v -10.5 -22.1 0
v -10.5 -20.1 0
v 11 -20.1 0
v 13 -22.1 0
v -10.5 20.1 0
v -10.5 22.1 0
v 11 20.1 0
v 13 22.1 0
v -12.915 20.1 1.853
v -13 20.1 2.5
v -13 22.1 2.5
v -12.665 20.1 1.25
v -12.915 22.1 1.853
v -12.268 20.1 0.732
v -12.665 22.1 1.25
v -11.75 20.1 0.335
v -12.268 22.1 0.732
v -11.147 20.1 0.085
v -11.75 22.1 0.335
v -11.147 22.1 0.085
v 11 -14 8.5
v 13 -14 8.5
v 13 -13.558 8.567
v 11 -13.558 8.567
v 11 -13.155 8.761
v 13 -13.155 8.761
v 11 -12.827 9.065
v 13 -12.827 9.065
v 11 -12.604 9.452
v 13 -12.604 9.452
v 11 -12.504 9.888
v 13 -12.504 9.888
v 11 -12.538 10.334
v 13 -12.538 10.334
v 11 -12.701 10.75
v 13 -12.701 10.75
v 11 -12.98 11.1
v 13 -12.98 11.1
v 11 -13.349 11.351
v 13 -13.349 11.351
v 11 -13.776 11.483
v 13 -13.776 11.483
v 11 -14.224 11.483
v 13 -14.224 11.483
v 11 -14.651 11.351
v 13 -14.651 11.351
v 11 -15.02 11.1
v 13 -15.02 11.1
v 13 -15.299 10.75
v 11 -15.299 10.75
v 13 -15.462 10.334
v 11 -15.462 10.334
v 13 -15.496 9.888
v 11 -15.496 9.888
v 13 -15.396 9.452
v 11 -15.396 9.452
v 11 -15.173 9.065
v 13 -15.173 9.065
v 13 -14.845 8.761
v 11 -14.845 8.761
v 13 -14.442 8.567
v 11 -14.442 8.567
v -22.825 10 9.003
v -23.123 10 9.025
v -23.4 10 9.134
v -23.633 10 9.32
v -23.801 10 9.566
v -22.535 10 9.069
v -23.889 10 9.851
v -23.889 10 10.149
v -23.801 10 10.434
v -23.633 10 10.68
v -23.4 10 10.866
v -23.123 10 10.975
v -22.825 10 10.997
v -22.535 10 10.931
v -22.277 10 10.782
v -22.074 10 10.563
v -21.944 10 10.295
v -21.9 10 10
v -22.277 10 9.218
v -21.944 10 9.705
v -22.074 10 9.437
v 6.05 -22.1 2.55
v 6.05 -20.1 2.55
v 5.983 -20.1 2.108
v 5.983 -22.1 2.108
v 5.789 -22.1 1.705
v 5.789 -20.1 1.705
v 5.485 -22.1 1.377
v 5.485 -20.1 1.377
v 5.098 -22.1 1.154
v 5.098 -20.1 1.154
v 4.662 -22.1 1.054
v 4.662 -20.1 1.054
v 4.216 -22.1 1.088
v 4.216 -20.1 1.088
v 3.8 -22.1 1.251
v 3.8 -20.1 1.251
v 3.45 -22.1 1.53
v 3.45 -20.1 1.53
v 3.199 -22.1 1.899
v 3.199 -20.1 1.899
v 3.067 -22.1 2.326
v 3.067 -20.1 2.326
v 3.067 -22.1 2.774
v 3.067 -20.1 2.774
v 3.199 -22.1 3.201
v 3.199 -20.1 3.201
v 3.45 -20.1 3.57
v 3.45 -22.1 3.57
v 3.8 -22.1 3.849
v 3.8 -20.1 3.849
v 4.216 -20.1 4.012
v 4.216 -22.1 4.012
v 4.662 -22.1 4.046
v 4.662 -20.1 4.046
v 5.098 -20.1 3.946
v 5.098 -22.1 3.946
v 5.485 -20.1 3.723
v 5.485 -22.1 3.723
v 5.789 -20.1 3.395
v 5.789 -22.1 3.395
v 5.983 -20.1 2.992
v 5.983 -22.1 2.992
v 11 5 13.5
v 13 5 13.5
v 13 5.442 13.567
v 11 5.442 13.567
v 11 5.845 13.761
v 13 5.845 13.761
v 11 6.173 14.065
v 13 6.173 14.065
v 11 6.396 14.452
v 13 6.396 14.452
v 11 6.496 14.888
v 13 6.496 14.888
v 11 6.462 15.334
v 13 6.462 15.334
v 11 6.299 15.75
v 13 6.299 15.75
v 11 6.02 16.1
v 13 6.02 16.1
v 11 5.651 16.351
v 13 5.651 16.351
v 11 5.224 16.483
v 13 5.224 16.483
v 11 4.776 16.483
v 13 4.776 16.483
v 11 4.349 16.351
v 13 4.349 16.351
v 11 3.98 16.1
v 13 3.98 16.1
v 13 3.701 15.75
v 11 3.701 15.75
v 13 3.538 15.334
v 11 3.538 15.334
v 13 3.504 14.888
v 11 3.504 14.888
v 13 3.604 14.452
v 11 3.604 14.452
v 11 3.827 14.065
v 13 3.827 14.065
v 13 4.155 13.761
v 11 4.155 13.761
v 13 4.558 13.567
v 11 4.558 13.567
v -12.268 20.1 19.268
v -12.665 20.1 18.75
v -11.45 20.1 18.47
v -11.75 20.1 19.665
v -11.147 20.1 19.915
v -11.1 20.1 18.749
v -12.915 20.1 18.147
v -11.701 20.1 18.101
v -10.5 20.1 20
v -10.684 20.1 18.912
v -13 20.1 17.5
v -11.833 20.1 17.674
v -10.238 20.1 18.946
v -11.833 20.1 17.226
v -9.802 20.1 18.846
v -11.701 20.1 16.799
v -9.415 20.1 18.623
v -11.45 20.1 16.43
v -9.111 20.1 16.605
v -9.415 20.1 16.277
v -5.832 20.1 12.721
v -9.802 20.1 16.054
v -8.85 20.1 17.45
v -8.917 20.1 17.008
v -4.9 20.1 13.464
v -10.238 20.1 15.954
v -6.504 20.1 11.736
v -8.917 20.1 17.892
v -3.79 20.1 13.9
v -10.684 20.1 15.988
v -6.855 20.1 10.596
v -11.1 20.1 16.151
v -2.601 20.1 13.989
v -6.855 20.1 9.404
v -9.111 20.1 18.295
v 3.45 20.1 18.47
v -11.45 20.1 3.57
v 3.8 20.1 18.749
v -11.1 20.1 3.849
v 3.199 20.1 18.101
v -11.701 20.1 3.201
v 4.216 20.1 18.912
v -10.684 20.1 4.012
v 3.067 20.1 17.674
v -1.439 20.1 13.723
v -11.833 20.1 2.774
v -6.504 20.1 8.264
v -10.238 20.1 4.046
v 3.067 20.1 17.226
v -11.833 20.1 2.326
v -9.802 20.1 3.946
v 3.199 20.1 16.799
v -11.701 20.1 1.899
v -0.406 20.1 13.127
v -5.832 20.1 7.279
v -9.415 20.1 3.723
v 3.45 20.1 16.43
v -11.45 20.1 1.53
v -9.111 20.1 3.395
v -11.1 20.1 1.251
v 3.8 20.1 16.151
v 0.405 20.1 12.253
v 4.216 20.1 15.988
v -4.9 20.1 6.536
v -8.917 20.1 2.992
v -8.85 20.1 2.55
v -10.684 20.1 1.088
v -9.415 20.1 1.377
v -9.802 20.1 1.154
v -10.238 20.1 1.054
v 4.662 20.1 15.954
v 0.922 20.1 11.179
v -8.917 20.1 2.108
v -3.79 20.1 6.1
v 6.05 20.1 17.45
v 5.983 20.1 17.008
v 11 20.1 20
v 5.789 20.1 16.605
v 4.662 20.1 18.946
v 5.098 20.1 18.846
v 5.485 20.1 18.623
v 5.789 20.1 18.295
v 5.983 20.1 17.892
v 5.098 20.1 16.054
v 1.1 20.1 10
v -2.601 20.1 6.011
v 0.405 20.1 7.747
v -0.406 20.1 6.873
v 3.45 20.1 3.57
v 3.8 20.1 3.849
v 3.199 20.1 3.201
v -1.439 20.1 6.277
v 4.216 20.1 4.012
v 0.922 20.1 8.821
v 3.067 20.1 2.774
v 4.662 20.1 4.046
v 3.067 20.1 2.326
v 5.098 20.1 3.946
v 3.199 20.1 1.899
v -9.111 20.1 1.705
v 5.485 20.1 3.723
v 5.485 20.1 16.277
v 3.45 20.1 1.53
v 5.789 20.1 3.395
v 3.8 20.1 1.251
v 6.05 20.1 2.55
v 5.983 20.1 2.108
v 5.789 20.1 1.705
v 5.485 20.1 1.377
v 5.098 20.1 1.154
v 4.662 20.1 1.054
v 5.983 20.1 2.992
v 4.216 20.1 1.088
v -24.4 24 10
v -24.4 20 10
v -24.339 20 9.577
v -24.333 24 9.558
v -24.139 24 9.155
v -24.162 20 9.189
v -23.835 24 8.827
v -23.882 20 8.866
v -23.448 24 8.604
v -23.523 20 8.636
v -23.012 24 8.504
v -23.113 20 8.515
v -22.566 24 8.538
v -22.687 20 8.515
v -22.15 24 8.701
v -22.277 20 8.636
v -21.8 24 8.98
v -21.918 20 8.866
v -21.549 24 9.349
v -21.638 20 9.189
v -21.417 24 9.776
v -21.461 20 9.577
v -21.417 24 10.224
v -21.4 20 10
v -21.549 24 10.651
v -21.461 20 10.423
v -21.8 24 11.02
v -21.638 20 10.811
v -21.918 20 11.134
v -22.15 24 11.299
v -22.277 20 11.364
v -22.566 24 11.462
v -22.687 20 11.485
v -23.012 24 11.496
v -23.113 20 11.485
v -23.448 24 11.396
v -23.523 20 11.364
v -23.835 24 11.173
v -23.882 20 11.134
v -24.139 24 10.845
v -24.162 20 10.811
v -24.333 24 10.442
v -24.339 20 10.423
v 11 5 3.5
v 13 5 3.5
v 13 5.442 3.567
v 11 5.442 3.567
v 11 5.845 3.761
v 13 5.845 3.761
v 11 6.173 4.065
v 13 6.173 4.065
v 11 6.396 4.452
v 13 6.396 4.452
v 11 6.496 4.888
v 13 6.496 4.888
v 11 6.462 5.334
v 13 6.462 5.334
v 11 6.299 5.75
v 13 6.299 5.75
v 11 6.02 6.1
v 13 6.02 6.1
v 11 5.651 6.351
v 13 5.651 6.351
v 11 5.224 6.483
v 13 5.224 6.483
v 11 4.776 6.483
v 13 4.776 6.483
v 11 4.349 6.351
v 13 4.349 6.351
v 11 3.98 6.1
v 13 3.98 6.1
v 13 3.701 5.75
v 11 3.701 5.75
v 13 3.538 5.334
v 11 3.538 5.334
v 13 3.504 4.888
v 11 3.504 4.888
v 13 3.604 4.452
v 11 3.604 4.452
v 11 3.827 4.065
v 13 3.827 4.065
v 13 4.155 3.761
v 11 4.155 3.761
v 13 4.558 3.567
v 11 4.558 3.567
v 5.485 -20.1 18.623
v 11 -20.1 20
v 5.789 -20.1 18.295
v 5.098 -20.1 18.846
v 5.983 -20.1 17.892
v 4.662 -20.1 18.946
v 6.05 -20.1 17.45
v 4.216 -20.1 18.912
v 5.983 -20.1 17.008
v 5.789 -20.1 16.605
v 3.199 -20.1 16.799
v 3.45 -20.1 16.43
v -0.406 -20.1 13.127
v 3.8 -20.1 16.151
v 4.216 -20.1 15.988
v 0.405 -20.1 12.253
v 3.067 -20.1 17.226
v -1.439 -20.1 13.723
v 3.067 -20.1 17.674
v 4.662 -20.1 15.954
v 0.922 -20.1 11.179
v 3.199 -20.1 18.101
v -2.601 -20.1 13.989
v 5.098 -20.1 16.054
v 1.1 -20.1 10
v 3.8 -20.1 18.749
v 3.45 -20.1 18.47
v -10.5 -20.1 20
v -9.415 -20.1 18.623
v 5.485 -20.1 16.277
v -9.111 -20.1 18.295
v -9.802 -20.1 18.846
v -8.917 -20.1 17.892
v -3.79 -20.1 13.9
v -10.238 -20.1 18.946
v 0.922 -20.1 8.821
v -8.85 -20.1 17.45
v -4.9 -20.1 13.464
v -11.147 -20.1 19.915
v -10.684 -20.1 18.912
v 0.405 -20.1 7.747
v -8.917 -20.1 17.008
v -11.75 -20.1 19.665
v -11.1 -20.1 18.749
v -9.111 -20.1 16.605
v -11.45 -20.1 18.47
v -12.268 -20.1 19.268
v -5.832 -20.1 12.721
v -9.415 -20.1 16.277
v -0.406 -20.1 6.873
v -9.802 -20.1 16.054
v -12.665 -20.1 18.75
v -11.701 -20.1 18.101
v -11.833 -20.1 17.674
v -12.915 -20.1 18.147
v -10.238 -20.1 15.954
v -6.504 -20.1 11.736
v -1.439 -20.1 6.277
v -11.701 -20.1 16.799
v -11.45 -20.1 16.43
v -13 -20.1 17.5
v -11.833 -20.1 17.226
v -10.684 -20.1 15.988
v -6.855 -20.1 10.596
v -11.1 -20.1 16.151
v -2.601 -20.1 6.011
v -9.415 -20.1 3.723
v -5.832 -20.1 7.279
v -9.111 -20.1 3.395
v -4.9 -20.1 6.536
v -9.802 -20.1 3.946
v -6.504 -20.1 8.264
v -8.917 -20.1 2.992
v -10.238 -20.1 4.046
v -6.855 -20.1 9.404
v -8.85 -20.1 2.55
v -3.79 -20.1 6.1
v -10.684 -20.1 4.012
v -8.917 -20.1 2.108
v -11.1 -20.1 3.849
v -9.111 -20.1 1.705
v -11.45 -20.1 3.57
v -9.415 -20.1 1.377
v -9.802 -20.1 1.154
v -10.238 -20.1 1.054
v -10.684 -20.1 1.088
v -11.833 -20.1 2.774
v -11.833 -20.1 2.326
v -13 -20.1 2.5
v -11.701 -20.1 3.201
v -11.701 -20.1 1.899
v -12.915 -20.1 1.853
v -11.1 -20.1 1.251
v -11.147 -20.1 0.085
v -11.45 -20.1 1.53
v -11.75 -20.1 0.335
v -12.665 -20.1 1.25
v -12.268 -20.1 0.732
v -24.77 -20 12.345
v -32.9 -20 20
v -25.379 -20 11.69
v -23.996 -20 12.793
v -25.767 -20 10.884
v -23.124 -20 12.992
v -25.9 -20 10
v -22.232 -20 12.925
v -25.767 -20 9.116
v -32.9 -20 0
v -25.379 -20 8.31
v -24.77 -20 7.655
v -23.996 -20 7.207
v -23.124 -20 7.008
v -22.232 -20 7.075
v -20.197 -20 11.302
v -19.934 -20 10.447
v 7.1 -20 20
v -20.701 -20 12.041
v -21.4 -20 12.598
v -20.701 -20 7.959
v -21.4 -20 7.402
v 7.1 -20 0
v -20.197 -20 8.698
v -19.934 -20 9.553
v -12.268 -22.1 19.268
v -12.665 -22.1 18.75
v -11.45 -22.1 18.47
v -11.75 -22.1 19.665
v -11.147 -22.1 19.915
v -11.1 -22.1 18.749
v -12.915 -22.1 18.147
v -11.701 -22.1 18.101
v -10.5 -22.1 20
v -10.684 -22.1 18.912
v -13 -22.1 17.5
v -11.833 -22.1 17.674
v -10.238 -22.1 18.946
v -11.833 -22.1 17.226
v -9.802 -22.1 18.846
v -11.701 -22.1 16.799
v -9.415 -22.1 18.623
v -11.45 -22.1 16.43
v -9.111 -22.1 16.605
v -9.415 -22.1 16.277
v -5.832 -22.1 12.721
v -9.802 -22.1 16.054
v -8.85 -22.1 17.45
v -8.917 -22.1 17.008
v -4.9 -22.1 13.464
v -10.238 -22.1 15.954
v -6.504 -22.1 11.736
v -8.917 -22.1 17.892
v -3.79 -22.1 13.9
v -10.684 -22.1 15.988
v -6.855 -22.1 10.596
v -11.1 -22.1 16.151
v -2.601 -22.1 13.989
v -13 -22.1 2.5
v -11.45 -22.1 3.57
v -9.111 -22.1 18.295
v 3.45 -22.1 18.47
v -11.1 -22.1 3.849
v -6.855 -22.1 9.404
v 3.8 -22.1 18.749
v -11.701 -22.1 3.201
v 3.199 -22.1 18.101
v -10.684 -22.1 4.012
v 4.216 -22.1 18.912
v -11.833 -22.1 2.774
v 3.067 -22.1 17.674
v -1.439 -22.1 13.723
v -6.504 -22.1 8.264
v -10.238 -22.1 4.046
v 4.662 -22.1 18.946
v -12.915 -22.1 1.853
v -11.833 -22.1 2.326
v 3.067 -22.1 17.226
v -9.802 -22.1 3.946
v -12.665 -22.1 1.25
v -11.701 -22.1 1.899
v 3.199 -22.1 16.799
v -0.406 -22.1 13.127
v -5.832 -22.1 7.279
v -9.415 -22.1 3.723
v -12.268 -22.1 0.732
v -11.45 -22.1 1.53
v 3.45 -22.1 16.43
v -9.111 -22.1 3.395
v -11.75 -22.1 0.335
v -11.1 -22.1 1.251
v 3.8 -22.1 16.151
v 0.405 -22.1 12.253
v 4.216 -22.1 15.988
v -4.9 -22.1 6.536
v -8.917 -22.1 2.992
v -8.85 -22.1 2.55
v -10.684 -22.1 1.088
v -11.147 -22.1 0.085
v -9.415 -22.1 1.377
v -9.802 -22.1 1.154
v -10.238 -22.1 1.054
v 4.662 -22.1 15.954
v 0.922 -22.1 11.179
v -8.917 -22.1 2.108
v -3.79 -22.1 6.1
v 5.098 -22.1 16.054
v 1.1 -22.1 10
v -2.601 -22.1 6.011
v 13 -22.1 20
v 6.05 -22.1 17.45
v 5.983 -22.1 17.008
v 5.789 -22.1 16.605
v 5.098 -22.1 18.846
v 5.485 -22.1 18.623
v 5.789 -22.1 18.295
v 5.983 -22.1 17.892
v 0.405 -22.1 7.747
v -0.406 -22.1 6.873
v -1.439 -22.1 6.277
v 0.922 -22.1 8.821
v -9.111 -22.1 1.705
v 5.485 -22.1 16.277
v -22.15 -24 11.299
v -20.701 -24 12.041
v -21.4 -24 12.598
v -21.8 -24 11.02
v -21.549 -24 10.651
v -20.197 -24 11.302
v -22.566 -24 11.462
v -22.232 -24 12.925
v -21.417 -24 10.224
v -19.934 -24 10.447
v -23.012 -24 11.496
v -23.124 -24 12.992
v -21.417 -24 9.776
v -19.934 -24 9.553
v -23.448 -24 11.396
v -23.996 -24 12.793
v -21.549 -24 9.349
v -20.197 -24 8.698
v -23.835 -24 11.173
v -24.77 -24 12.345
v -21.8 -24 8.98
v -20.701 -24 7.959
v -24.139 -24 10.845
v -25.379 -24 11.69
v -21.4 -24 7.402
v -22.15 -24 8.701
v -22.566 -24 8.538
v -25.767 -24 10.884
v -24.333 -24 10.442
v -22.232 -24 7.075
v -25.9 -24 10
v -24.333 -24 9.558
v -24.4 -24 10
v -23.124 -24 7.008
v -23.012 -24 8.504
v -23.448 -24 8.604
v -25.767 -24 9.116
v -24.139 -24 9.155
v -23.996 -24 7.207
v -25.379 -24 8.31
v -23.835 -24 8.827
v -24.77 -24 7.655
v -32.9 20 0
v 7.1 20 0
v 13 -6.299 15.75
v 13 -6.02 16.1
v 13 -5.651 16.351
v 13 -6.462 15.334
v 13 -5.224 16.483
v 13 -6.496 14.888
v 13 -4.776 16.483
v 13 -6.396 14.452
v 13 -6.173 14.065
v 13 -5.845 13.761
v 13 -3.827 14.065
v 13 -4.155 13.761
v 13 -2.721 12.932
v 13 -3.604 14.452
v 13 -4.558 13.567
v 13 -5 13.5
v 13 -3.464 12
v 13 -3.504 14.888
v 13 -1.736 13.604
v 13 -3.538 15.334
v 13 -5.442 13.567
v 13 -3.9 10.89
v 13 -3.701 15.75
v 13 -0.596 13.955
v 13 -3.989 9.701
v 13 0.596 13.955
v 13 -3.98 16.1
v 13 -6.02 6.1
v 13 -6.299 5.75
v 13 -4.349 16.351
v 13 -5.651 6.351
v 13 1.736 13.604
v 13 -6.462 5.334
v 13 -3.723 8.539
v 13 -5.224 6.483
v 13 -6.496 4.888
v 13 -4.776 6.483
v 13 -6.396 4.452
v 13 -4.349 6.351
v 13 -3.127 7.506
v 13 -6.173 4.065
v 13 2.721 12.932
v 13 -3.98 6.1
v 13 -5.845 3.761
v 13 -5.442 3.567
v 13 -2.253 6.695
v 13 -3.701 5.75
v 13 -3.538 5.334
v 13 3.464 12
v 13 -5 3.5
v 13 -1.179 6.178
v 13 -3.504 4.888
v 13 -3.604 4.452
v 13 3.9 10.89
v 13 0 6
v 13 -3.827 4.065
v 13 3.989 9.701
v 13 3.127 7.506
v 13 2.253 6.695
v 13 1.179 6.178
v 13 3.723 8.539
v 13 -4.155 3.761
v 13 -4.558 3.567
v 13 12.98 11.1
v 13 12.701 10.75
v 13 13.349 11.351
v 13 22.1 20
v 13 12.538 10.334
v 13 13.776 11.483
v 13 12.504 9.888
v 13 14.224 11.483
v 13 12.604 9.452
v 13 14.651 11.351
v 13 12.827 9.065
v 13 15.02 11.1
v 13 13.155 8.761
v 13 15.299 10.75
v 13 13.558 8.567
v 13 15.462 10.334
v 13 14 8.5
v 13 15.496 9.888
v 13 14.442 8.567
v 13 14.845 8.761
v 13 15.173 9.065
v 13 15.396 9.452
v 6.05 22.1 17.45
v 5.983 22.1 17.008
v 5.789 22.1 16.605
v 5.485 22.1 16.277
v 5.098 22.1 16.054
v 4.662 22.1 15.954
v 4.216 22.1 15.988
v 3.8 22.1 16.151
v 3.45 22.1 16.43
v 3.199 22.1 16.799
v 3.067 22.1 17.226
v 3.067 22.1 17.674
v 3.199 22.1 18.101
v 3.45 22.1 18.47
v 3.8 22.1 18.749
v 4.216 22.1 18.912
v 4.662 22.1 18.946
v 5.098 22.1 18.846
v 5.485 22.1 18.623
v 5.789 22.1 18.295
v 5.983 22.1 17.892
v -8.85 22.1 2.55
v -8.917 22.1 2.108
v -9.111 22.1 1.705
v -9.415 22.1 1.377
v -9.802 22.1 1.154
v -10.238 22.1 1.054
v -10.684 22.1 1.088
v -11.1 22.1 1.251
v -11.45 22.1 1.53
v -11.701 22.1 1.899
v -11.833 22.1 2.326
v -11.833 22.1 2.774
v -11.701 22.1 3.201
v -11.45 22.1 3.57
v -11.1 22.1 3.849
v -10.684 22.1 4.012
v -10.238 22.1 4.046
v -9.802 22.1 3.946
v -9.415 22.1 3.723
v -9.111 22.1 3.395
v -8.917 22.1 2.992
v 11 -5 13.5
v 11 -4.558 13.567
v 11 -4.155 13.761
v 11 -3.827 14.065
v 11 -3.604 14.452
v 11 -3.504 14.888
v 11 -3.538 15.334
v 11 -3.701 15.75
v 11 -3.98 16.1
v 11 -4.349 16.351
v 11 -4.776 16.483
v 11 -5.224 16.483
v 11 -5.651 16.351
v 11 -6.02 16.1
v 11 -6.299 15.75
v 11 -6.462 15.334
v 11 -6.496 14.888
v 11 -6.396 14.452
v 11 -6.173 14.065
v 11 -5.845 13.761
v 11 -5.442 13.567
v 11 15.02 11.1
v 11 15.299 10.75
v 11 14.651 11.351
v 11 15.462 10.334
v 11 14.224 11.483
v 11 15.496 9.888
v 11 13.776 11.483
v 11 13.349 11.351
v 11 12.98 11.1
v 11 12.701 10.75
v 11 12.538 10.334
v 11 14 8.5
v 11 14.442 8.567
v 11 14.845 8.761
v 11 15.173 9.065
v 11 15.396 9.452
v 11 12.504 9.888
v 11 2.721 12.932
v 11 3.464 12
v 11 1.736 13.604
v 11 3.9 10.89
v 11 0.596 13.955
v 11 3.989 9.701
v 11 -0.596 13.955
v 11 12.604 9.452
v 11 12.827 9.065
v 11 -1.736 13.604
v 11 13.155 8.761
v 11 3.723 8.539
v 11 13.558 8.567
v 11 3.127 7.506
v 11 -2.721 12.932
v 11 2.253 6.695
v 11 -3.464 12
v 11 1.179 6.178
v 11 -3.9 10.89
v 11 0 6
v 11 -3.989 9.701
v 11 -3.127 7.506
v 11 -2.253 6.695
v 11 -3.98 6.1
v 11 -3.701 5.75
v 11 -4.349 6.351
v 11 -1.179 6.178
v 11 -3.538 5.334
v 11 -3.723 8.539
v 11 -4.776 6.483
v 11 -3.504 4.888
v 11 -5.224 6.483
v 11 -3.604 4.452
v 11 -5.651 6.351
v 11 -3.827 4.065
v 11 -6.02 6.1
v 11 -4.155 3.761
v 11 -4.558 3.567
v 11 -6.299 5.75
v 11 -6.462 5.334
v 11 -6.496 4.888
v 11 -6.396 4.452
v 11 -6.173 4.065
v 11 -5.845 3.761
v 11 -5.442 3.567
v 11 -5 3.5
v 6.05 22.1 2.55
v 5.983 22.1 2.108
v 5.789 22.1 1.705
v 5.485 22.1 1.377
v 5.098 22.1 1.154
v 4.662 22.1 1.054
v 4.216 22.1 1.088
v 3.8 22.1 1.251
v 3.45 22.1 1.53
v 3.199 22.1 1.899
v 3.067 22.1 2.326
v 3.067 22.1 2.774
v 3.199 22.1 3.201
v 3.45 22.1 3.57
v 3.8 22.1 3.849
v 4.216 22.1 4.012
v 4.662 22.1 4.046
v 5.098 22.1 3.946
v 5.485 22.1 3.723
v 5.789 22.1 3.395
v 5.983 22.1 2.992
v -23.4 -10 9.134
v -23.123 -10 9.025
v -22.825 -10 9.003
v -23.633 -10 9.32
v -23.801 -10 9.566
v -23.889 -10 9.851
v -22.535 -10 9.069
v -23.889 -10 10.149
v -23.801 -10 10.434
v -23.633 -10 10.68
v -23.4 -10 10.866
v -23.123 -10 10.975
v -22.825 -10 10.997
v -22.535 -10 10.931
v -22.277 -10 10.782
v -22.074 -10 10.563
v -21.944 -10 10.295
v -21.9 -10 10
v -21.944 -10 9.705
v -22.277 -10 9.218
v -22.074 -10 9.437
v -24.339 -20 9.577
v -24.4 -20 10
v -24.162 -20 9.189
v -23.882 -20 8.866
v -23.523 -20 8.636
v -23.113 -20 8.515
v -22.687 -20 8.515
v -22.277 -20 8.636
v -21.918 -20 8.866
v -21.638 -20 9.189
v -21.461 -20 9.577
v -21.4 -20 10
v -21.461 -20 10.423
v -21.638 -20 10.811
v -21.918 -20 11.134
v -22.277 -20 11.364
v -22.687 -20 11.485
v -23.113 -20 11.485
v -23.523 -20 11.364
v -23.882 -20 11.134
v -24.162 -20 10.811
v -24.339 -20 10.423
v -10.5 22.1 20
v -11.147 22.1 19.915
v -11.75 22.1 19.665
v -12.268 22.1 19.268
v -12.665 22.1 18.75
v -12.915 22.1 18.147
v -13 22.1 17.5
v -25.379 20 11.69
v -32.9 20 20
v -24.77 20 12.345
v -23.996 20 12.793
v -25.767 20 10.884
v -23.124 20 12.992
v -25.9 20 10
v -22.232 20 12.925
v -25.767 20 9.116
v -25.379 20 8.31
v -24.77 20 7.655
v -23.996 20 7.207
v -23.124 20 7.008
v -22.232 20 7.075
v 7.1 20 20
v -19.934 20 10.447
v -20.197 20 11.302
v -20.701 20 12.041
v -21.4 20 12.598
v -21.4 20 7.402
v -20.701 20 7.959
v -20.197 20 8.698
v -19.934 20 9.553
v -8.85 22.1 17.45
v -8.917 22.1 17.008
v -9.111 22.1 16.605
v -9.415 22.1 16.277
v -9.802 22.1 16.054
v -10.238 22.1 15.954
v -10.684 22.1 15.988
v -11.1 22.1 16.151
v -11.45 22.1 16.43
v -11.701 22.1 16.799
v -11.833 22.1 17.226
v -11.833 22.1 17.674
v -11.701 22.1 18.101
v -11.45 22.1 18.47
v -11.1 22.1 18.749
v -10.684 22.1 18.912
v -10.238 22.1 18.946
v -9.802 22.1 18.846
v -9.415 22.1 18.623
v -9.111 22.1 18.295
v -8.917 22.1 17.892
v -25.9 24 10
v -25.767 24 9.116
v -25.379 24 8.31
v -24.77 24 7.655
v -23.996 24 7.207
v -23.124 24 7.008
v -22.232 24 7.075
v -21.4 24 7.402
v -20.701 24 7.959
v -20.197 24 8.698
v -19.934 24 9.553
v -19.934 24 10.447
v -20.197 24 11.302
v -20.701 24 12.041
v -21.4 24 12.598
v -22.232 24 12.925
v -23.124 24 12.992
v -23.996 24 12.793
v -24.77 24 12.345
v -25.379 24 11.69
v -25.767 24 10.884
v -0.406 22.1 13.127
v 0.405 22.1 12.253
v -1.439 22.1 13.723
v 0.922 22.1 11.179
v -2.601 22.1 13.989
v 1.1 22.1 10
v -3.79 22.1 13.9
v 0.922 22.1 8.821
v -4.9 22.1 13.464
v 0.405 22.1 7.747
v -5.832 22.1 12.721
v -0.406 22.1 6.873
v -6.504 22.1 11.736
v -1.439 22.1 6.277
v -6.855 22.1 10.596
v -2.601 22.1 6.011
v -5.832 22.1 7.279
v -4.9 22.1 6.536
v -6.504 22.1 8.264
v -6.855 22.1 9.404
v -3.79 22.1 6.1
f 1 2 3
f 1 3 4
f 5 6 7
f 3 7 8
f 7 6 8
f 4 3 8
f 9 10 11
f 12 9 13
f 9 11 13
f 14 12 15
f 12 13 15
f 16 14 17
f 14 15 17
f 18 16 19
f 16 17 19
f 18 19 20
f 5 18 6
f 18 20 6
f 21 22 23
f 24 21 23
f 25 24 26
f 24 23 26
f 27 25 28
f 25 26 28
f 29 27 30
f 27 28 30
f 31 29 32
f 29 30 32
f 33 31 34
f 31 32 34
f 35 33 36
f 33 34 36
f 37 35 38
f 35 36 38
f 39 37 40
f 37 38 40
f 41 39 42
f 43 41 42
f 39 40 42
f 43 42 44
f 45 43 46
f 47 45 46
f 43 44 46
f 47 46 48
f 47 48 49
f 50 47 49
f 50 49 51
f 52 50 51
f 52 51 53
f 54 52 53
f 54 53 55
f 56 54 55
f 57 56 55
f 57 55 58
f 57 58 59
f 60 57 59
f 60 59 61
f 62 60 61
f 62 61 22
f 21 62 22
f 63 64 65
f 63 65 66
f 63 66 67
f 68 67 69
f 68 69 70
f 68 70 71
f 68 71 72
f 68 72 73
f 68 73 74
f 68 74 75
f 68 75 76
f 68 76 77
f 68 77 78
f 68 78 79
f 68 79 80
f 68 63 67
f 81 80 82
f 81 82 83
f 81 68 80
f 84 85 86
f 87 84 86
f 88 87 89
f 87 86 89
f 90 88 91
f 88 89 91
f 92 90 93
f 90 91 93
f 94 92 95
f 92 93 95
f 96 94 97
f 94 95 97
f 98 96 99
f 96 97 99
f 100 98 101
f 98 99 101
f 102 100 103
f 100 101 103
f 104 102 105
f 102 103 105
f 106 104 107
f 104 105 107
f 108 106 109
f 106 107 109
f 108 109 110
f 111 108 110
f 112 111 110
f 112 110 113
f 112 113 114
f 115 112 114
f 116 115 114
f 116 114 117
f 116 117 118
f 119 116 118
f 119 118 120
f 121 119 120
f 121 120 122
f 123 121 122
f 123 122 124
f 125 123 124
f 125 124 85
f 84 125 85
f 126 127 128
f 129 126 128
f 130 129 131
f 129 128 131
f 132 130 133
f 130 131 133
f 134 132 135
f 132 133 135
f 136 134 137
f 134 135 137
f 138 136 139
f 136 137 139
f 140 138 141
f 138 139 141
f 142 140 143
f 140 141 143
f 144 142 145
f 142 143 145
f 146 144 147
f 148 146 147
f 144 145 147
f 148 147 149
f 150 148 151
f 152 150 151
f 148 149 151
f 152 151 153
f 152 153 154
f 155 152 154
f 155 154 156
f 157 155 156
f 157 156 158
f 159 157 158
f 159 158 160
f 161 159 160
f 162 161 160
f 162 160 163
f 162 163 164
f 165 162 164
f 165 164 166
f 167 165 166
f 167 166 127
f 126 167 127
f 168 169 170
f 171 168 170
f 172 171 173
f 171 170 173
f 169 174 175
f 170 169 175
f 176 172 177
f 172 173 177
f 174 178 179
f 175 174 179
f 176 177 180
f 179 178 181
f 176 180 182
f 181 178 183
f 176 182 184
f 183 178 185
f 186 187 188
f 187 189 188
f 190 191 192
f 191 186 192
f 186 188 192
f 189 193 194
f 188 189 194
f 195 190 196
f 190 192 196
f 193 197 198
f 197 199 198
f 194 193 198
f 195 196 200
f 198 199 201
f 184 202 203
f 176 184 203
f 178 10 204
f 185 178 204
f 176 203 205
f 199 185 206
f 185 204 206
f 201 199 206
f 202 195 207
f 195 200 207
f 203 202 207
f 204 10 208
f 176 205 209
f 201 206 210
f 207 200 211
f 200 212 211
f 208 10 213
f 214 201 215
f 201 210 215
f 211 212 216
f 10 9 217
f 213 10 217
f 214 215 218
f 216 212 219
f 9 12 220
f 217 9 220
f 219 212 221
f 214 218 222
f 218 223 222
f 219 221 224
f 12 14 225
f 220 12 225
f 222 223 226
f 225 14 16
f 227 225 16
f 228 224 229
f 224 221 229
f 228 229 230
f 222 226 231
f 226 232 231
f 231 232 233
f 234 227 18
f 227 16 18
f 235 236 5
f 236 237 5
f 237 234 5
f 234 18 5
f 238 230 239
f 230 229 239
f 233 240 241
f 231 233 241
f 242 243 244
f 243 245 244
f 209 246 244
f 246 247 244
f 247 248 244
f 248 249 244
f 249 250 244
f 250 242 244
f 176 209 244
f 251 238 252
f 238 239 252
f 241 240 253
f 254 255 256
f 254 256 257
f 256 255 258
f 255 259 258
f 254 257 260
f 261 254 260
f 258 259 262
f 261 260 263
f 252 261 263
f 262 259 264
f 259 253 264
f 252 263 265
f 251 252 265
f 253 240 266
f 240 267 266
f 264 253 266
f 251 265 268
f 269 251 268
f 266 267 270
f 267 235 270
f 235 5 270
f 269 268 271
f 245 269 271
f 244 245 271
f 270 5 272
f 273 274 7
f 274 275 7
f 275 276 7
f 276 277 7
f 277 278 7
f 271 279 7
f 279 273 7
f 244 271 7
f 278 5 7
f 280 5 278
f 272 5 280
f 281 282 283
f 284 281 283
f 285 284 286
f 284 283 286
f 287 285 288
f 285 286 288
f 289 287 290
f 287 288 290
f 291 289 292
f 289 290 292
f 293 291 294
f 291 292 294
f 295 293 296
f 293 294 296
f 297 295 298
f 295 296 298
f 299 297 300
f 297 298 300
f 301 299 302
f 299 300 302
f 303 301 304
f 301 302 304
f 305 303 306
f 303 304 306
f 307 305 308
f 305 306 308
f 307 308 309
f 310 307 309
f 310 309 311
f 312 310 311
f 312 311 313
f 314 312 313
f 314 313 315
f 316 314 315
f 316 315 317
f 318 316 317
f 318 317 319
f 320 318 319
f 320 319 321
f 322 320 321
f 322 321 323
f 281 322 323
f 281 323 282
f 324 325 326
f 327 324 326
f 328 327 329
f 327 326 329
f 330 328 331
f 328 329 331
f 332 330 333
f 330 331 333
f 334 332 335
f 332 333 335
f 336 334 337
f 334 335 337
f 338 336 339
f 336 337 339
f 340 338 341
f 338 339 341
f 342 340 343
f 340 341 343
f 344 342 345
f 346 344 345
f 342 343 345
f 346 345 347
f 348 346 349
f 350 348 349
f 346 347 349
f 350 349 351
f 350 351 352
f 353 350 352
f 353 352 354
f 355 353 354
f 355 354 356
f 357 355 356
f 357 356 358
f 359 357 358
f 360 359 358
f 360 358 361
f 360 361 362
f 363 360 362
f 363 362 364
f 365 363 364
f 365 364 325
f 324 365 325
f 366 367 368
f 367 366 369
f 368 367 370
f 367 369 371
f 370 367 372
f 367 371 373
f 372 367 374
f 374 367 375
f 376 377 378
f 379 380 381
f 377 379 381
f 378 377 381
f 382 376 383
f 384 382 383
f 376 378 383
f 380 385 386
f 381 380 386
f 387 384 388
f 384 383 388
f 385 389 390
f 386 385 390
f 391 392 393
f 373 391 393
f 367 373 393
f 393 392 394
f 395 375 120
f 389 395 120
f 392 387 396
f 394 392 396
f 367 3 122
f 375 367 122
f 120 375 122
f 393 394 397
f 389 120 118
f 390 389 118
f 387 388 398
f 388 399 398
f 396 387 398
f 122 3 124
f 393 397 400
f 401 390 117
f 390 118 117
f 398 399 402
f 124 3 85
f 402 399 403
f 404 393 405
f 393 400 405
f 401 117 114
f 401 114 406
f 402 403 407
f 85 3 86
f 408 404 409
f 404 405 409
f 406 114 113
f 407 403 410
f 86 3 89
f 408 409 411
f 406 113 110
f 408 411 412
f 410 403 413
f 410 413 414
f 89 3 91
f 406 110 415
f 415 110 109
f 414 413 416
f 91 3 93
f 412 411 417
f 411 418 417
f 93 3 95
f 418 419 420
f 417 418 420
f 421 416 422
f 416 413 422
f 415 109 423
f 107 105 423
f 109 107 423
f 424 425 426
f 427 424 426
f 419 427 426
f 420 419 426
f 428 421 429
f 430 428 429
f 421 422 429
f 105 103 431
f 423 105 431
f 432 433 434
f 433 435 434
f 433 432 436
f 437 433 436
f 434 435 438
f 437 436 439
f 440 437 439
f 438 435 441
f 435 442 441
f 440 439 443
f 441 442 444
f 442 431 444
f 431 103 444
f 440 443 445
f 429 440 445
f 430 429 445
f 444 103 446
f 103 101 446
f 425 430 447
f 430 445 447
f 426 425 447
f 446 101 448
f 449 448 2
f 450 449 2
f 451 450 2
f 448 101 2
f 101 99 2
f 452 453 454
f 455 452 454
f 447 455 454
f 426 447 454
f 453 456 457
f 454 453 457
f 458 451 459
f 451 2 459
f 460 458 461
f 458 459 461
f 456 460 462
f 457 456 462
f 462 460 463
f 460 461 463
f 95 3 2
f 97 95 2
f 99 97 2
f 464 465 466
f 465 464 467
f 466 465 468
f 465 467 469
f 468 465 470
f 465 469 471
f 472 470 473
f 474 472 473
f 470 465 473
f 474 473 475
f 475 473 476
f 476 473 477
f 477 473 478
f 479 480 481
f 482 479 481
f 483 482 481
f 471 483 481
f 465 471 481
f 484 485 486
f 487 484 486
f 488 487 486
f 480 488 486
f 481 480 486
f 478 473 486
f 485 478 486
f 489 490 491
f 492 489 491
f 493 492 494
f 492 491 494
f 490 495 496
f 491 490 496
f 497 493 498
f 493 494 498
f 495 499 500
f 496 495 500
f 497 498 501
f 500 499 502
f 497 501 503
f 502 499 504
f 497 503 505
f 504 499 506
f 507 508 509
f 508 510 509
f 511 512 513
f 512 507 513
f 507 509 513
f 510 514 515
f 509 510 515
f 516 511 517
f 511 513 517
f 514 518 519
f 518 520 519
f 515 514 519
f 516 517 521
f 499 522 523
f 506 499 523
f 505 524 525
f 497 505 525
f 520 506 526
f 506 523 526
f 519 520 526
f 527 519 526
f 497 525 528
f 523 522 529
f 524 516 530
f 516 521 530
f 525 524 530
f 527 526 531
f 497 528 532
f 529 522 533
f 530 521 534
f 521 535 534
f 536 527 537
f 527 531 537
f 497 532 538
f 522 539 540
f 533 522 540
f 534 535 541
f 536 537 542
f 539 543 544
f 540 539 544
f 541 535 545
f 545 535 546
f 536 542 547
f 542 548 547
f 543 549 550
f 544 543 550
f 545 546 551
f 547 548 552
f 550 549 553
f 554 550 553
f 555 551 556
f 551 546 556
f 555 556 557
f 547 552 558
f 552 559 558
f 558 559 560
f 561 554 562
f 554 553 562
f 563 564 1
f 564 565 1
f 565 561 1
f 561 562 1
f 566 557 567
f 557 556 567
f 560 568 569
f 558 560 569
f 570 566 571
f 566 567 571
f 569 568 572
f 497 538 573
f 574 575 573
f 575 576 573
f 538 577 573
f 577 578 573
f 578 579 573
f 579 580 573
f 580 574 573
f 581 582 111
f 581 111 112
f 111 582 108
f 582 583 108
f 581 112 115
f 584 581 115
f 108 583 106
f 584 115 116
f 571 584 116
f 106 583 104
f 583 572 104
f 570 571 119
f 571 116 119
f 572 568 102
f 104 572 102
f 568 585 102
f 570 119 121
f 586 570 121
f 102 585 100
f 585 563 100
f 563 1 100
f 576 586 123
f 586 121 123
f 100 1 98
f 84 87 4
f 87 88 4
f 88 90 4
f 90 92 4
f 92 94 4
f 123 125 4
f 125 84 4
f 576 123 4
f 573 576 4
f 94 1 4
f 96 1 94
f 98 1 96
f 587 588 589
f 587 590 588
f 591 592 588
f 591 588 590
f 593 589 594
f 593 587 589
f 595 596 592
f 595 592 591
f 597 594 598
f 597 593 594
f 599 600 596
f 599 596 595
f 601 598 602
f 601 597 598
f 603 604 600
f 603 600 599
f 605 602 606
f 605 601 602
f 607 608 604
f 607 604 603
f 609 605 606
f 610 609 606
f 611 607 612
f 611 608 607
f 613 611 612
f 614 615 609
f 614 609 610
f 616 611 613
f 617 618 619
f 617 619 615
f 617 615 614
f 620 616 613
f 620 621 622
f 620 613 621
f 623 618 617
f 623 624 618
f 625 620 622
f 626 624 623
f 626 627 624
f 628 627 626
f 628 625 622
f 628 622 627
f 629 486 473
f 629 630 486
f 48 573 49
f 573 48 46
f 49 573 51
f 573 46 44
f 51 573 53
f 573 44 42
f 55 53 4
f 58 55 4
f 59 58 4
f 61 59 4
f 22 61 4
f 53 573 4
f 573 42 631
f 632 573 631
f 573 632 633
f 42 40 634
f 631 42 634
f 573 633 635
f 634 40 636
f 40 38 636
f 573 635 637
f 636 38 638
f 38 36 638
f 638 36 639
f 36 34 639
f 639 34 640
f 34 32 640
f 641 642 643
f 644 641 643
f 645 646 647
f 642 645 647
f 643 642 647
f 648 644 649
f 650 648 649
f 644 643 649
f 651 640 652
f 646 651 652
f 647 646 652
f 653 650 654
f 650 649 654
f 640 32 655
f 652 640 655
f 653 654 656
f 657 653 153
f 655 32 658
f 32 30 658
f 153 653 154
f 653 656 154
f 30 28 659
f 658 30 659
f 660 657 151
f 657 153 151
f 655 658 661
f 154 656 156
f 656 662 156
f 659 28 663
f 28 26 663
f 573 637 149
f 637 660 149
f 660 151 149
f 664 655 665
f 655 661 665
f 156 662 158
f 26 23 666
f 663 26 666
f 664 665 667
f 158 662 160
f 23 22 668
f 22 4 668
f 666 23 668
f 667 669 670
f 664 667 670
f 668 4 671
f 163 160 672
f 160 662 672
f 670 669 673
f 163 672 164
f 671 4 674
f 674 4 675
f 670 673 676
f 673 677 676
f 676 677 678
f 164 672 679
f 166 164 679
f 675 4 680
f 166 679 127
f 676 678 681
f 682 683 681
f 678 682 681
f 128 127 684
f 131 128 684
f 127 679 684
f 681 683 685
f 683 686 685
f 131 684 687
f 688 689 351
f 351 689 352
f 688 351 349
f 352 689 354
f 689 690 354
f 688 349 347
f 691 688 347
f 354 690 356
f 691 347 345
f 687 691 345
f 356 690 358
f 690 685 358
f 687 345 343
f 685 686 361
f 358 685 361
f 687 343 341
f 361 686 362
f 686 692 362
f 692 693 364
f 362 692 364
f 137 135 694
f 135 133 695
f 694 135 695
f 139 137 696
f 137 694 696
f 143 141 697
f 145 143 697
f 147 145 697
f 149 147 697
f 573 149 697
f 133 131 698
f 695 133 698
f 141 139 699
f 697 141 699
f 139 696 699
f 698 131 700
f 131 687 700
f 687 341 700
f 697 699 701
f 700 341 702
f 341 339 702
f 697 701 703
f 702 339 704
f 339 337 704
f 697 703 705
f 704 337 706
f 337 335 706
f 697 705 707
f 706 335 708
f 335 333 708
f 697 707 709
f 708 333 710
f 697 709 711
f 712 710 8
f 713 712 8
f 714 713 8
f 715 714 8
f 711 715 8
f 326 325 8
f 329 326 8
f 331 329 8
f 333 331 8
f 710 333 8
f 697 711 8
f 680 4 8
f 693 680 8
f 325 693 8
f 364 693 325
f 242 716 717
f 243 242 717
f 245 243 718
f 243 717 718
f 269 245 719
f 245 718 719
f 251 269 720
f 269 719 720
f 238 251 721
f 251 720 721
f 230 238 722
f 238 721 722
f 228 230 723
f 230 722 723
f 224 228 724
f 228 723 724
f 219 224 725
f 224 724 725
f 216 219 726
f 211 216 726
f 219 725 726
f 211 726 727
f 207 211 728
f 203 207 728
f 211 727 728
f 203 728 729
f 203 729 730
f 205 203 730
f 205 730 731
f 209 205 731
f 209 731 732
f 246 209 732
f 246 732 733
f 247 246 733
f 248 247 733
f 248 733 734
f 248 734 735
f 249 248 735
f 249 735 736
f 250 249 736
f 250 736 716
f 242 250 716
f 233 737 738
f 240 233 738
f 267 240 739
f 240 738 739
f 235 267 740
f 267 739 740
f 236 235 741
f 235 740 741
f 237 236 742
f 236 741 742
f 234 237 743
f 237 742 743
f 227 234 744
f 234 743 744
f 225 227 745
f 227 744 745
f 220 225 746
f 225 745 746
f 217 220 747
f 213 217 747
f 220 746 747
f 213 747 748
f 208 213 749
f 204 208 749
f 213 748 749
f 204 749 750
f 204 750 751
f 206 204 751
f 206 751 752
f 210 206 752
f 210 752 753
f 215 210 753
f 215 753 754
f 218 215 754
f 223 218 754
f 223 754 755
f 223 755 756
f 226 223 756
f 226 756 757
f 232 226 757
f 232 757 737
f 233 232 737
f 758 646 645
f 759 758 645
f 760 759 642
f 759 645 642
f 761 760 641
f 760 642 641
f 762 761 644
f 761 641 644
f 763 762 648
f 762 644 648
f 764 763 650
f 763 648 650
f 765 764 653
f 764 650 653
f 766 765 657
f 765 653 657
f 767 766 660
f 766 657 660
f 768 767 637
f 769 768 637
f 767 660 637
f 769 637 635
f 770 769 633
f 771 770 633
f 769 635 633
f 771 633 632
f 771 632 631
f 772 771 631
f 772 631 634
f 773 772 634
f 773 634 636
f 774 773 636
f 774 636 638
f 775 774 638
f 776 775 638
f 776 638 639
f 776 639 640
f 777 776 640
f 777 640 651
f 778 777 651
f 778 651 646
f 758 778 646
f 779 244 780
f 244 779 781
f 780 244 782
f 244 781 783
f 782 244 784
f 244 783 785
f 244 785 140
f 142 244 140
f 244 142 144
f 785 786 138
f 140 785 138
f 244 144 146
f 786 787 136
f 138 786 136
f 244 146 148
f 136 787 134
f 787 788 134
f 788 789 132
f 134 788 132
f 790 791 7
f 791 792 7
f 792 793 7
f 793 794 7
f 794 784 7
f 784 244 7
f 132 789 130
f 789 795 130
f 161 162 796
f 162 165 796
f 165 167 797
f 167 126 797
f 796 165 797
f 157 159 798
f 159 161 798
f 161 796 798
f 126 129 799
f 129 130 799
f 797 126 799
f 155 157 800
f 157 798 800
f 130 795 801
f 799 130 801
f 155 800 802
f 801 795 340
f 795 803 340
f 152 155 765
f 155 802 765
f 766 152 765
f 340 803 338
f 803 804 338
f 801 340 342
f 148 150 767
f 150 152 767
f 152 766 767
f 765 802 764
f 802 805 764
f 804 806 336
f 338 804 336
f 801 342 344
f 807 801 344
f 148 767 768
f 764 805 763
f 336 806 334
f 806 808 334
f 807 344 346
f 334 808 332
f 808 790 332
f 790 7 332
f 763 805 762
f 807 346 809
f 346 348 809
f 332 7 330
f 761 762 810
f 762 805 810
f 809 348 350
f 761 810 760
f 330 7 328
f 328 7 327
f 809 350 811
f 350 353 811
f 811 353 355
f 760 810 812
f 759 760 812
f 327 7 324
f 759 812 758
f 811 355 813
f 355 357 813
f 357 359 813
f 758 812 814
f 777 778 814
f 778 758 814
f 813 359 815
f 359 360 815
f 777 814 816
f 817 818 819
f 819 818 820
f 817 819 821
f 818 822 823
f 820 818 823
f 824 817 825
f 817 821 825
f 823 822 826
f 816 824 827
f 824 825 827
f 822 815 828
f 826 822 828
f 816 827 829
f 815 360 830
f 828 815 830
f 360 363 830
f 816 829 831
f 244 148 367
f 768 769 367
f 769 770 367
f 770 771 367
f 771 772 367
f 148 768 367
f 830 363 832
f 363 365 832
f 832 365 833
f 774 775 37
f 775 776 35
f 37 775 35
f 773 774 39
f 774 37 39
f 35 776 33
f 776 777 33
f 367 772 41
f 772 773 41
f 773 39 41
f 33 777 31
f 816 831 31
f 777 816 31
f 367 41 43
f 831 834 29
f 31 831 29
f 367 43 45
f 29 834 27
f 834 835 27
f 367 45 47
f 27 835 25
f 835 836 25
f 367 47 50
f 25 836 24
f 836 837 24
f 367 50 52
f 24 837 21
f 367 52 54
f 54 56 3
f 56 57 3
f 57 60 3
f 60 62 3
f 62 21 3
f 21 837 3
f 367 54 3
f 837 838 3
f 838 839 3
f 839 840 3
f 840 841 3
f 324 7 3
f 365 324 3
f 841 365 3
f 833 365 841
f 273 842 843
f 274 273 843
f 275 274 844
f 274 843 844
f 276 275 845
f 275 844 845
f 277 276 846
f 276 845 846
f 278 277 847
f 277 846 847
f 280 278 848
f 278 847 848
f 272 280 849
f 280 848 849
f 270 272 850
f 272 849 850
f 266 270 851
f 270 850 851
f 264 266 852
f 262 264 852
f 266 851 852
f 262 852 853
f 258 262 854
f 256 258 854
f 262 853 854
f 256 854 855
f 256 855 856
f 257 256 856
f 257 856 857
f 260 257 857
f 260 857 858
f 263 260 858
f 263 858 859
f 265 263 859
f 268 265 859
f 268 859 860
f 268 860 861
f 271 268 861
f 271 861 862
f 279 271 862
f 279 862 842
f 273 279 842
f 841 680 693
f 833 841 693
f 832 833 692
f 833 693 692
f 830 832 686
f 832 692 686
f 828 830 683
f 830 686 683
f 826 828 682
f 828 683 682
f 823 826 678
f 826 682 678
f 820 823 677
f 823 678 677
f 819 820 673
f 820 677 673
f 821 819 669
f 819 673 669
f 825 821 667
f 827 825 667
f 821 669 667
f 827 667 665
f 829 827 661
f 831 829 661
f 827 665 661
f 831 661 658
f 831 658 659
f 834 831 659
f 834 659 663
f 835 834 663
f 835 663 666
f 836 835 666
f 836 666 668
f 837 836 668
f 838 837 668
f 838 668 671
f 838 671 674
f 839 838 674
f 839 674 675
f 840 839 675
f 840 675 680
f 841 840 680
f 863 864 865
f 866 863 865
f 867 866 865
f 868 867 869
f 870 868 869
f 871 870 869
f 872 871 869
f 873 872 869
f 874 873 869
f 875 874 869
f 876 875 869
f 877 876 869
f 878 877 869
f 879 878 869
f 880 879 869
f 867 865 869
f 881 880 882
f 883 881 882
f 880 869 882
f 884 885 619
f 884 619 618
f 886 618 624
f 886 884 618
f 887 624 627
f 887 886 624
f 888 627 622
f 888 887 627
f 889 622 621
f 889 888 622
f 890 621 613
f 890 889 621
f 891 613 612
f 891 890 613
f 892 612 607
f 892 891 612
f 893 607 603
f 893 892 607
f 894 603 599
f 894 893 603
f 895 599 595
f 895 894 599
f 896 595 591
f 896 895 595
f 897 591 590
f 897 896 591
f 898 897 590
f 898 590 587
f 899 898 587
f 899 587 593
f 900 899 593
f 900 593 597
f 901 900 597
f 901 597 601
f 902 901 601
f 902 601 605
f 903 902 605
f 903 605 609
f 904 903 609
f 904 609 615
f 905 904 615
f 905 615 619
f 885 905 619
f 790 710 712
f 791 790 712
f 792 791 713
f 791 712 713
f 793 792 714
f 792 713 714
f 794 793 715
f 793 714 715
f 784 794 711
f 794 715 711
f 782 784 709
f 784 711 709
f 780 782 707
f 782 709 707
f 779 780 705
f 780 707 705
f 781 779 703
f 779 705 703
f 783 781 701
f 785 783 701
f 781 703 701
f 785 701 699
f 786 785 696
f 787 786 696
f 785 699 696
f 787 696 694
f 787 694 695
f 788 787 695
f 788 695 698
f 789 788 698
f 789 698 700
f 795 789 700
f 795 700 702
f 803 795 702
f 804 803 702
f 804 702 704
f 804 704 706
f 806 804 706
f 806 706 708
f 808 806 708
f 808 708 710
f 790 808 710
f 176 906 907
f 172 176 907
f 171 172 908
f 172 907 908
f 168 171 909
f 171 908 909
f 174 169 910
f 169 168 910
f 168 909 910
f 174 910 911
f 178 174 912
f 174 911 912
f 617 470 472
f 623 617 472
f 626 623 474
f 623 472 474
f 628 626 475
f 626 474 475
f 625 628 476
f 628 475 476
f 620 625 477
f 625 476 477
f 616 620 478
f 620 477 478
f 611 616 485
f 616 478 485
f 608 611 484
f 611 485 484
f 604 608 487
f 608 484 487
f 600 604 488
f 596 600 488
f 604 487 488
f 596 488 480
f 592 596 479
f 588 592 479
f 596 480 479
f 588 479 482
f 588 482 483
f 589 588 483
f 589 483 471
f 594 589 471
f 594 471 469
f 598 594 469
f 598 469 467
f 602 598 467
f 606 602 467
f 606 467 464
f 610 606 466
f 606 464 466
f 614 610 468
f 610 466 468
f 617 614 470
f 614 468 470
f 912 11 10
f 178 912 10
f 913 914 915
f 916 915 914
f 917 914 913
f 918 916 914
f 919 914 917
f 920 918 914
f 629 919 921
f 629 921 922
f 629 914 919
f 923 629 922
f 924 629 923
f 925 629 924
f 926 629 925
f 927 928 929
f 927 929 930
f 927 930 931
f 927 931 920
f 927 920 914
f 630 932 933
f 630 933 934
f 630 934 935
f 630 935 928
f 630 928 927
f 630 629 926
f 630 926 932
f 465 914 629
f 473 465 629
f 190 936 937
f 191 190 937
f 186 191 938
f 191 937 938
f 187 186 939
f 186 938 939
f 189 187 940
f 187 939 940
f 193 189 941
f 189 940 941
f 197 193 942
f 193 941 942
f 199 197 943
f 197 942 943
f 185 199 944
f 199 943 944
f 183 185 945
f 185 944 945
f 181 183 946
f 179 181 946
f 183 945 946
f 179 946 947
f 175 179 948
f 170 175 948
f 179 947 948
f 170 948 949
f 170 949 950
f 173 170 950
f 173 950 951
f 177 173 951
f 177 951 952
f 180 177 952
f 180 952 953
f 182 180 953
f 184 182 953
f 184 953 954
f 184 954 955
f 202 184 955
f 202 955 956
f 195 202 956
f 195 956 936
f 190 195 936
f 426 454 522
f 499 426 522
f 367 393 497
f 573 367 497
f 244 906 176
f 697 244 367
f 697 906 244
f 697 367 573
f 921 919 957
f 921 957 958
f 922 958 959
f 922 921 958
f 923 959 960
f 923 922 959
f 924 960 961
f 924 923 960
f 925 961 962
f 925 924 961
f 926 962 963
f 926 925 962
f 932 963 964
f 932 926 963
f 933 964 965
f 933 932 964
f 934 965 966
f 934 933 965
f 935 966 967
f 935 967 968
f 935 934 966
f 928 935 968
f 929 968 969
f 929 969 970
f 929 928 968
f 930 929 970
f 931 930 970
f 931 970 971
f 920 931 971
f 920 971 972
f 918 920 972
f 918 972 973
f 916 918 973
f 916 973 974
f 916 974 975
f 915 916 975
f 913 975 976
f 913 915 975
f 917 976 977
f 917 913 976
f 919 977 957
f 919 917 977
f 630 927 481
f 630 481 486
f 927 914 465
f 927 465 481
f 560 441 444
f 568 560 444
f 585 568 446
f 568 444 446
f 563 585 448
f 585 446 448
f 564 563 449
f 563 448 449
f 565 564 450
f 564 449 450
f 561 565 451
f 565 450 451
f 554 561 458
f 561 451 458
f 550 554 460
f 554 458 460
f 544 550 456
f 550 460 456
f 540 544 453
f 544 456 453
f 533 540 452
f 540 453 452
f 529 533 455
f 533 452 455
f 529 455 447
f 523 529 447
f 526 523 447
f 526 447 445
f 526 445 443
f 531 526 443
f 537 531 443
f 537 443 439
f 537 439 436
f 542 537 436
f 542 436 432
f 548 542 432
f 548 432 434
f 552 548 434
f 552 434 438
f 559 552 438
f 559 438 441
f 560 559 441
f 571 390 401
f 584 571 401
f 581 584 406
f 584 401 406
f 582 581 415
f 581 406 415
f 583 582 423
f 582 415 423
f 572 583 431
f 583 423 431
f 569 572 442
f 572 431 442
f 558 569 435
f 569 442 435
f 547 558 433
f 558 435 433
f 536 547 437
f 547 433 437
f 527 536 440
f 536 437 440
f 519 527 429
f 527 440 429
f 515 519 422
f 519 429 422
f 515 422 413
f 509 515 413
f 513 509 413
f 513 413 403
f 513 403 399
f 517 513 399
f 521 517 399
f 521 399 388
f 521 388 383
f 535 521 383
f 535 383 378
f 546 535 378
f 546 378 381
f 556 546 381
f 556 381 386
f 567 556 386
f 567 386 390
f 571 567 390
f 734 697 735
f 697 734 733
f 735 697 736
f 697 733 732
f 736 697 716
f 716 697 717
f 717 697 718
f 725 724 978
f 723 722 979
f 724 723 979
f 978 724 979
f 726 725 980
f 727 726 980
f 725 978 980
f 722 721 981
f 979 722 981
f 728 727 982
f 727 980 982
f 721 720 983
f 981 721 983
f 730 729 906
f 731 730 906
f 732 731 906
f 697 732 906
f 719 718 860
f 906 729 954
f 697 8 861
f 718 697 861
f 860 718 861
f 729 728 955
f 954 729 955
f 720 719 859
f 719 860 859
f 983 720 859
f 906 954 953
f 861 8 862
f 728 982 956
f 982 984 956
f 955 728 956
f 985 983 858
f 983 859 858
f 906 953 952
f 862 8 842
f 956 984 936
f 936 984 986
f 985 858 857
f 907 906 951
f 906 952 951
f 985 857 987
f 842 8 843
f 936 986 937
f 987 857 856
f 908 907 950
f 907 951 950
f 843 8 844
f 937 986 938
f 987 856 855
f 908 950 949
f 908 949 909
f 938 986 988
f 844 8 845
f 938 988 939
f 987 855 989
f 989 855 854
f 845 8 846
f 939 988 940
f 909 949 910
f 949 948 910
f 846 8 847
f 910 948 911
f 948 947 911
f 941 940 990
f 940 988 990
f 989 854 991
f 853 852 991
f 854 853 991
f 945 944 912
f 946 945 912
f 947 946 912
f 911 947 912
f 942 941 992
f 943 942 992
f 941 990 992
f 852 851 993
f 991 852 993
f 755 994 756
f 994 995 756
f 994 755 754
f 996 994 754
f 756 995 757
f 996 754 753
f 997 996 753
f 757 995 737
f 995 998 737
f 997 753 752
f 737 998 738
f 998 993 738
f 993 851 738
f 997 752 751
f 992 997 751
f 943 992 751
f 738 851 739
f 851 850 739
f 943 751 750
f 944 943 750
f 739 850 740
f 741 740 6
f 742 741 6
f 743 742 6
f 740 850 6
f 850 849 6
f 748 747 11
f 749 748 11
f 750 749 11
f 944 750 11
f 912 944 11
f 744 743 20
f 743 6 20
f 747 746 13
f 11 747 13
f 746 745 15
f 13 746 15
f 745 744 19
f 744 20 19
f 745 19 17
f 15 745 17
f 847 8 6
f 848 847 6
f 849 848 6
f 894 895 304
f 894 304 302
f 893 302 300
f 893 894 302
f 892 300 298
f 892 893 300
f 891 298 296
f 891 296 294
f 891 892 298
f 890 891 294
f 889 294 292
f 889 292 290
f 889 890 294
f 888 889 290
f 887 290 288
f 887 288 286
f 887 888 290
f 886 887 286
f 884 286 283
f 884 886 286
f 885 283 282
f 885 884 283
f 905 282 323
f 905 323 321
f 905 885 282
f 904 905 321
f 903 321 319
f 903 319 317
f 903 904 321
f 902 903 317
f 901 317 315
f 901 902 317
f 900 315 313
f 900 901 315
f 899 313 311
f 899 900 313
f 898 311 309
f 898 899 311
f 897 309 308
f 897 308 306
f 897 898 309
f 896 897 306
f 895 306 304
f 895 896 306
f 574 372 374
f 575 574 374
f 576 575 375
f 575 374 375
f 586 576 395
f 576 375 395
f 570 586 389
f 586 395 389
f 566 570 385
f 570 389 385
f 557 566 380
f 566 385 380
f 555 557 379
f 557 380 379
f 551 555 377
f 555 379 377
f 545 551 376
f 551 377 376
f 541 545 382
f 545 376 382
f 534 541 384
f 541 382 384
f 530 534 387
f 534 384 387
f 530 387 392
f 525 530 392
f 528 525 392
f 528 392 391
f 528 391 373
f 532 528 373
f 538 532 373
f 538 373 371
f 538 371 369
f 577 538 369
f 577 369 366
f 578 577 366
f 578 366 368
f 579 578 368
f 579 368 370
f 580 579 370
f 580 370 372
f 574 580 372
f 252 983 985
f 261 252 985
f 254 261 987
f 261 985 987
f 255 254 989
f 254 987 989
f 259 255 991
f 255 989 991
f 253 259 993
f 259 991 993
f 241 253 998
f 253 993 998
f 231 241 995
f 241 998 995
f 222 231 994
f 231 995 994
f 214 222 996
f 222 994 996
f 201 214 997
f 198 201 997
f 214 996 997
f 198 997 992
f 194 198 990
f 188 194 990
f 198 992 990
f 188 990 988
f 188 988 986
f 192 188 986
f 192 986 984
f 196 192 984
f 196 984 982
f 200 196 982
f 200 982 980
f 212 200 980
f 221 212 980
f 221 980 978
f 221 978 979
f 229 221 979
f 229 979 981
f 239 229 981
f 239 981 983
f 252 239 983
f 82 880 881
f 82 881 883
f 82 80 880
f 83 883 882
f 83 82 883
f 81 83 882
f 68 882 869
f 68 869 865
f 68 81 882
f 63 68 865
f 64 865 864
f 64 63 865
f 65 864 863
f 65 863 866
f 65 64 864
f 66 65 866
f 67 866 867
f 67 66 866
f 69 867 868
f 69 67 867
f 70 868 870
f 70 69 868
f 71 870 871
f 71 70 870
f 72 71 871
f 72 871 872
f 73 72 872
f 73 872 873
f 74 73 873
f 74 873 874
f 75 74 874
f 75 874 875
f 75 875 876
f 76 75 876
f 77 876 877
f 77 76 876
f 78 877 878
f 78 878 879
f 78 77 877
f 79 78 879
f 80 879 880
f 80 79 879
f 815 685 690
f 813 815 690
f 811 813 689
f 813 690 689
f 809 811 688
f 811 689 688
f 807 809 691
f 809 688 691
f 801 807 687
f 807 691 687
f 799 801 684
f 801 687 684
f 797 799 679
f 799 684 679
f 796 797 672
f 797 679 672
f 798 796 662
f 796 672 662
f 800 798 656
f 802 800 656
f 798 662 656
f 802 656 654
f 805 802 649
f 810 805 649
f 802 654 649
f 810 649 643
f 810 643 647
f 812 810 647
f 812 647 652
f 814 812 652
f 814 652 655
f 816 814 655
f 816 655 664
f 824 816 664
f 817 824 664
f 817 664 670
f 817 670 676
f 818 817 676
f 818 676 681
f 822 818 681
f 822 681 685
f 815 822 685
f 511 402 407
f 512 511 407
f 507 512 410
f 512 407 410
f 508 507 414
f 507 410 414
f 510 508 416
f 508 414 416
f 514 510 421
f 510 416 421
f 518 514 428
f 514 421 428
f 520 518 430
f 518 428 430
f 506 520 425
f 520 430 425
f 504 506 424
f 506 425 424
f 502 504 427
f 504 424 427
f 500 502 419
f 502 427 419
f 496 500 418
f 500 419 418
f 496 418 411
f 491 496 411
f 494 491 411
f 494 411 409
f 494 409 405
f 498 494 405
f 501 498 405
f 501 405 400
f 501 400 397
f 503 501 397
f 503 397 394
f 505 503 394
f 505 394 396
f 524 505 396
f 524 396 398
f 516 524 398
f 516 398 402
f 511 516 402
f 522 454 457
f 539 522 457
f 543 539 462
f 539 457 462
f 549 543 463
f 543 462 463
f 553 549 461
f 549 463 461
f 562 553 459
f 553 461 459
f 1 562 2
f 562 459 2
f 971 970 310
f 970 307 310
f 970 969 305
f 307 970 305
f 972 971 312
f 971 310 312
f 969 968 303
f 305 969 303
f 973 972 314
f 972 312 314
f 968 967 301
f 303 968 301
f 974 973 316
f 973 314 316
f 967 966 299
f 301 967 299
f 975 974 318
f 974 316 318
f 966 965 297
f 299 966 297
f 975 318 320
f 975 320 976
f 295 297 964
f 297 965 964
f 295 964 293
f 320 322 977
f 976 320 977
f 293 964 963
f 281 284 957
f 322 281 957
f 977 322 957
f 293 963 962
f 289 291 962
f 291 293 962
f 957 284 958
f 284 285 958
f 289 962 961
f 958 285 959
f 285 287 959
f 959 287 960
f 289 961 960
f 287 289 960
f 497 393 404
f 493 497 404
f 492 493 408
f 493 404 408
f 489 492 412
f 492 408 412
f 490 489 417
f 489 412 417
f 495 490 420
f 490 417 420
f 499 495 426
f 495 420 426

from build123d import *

# Parameters (mm, degrees)
SALIENTE_EXTRUIR1_DEPTH    = 20
CORTAR_EXTRUIR1_DEPTH      = 45.2
CROQUIS3_R                 = 4
CROQUIS3_R_2               = 1.5
CORTAR_EXTRUIR2_DEPTH      = 1
CORTAR_EXTRUIR2_DEPTH_BACK = 45.2
CROQUIS4_R                 = 4
CROQUIS4_R_2               = 1.5
CORTAR_EXTRUIR3_DEPTH      = 20
CROQUIS5_R                 = 1.5
CORTAR_EXTRUIR4_DEPTH      = 20
CROQUIS7_R                 = 1
SALIENTE_EXTRUIR2_DEPTH    = 10
CROQUIS8_W                 = 20
CROQUIS8_H                 = 20
CROQUIS8_R                 = 1.5
SALIENTE_EXTRUIR4_DEPTH    = 20
CROQUIS9_R                 = 3
CROQUIS9_R_2               = 1.5
SALIENTE_EXTRUIR5_DEPTH    = 4


with BuildPart() as part:
    # Croquis1 → Saliente-Extruir1 (new body)
    with BuildSketch(Plane.XY):
        Polygon((11, -20.1), (-13, -20.1), (-13, -22.1), (13, -22.1), (13, 22.1), (-13, 22.1), (-13, 20.1), (11, 20.1), align=None)
    extrude(amount=SALIENTE_EXTRUIR1_DEPTH)

    # Croquis2 → Cortar-Extruir1 (cut, through all)
    with BuildSketch(Plane(origin=(0, 22.1, 0), x_dir=(1, 0, 0), z_dir=(0, 1, 0))):
        with BuildLine():
            Line((-13, -17.5), (-13, -20))
            Line((-13, -20), (-10.5, -20))
            ThreePointArc((-10.5, -20), (-12.267766953, -19.267766953), (-13, -17.5))
        make_face()
        with BuildLine():
            Line((-13, 0), (-13, -2.5))
            ThreePointArc((-13, -2.5), (-12.267766953, -0.732233047), (-10.5, 0))
            Line((-10.5, 0), (-13, 0))
        make_face()
    extrude(amount=-CORTAR_EXTRUIR1_DEPTH, mode=Mode.SUBTRACT)

    # Croquis3 → Cortar-Extruir2 (cut, two sides)
    with BuildSketch(Plane(origin=(0, 22.1, 0), x_dir=(1, 0, 0), z_dir=(0, 1, 0))) as cortar_extruir2_sk:
        with Locations((-2.9, -10)):
            Circle(CROQUIS3_R)
        with Locations((-10.35, -17.45)):
            Circle(CROQUIS3_R_2)
        with Locations((-10.35, -2.55)):
            Circle(CROQUIS3_R_2)
        with Locations((4.55, -17.45)):
            Circle(CROQUIS3_R_2)
        with Locations((4.55, -2.55)):
            Circle(CROQUIS3_R_2)
    extrude(amount=CORTAR_EXTRUIR2_DEPTH, mode=Mode.SUBTRACT)
    extrude(cortar_extruir2_sk.sketch, amount=-CORTAR_EXTRUIR2_DEPTH_BACK, mode=Mode.SUBTRACT)

    # Croquis4 → Cortar-Extruir3 (cut)
    with BuildSketch(Plane(origin=(13, 0, 0), x_dir=(0, 0, -1), z_dir=(1, 0, 0))):
        with Locations((-10, 0)):
            Circle(CROQUIS4_R)
        with Locations((-15, 5)):
            Circle(CROQUIS4_R_2)
        with Locations((-5, 5)):
            Circle(CROQUIS4_R_2)
        with Locations((-5, -5)):
            Circle(CROQUIS4_R_2)
        with Locations((-15, -5)):
            Circle(CROQUIS4_R_2)
    extrude(amount=-CORTAR_EXTRUIR3_DEPTH, mode=Mode.SUBTRACT)

    # Croquis5 → Cortar-Extruir4 (cut)
    with BuildSketch(Plane(origin=(13, 0, 0), x_dir=(0, 0, -1), z_dir=(1, 0, 0))):
        with Locations((-10, 14)):
            Circle(CROQUIS5_R)
        with Locations((-10, -14)):
            Circle(CROQUIS5_R)
    extrude(amount=-CORTAR_EXTRUIR4_DEPTH, mode=Mode.SUBTRACT)


with BuildPart() as body_2:
    # Croquis7 → Saliente-Extruir2 (new body, symmetric)
    with BuildSketch(Plane(origin=(0, 0, 0), x_dir=(1, 0, 0), z_dir=(0, 1, 0))):
        with Locations((-22.9, -10)):
            Circle(CROQUIS7_R)
    extrude(amount=SALIENTE_EXTRUIR2_DEPTH, both=True)


with BuildPart() as body_3:
    # Croquis8 → Saliente-Extruir4 (new body, symmetric)
    with BuildSketch(Plane(origin=(0, 0, 0), x_dir=(1, 0, 0), z_dir=(0, 1, 0))):
        with Locations((-22.9, -10)):
            Rectangle(CROQUIS8_W, CROQUIS8_H)
        with Locations((-22.9, -10)):
            Circle(CROQUIS8_R, mode=Mode.SUBTRACT)
        with Locations((-2.9, -10)):
            Rectangle(CROQUIS8_W, CROQUIS8_H)
    extrude(amount=SALIENTE_EXTRUIR4_DEPTH, both=True)

    # Croquis9 → Saliente-Extruir5 (add)
    with BuildSketch(Plane(origin=(0, -20, 0), x_dir=(-1, 0, 0), z_dir=(0, -1, 0))):
        with Locations((22.9, -10)):
            Circle(CROQUIS9_R)
        with Locations((22.9, -10)):
            Circle(CROQUIS9_R_2, mode=Mode.SUBTRACT)
    saliente_extruir5 = extrude(amount=SALIENTE_EXTRUIR5_DEPTH)

    # Simetría1: Saliente-Extruir5 across plane
    add(saliente_extruir5.mirror(Plane.ZX))


solid = Compound([part.part, body_2.part, body_3.part])
